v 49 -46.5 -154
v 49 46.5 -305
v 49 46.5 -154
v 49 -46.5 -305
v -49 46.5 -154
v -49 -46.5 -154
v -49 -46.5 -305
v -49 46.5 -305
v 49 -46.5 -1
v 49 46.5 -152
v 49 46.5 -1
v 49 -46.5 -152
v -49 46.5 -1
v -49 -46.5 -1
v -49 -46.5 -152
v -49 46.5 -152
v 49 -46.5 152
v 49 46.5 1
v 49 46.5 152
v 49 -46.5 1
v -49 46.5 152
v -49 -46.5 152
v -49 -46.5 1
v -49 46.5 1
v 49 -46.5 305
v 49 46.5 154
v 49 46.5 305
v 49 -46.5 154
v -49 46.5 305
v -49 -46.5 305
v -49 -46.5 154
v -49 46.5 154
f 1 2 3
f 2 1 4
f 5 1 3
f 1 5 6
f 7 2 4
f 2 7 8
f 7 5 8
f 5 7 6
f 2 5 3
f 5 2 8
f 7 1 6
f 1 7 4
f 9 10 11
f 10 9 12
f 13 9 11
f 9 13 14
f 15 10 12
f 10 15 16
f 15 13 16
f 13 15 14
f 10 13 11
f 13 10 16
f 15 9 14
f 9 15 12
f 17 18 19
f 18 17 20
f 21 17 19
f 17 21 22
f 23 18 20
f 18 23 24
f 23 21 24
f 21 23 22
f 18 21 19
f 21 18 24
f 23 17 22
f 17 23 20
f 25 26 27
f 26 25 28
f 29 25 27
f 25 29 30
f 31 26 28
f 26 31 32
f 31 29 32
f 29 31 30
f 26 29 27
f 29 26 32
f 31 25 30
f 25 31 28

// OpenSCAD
// file: battery.scad
/*
DESCRIPTION
  Model of a 12V battery.

AUTHORS
  Saxon A. Nelson-Milton <saxon@ausocean.org>

LICENSE
  Copyright (C) 2020 the Australian Ocean Lab (AusOcean)

  It is free software: you can redistribute it and/or modify them
  under the terms of the GNU General Public License as published by the
  Free Software Foundation, either version 3 of the License, or (at your
  option) any later version.

  It is distributed in the hope that it will be useful, but WITHOUT
  ANY WARRANTY; without even the implied warranty of MERCHANTABILITY or
  FITNESS FOR A PARTICULAR PURPOSE. See the GNU General Public License
  for more details.

  You should have received a copy of the GNU General Public License
  in gpl.txt.  If not, see http://www.gnu.org/licenses.
*/

include <consts.scad>

battery();

module battery(){
    color([0.2,0.2,0.2])
    cube([battWidth,battHeight,battLength],center=true);
}
// file: consts.scad
/*
DESCRIPTION
  Constants for SCUSU CAD model.

AUTHORS
  Saxon A. Nelson-Milton <saxon@ausocean.org>

LICENSE
  Copyright (C) 2020 the Australian Ocean Lab (AusOcean)

  It is free software: you can redistribute it and/or modify them
  under the terms of the GNU General Public License as published by the
  Free Software Foundation, either version 3 of the License, or (at your
  option) any later version.

  It is distributed in the hope that it will be useful, but WITHOUT
  ANY WARRANTY; without even the implied warranty of MERCHANTABILITY or
  FITNESS FOR A PARTICULAR PURPOSE. See the GNU General Public License
  for more details.

  You should have received a copy of the GNU General Public License
  in gpl.txt.  If not, see http://www.gnu.org/licenses.
*/

alpha = 0.5;

// Misc.
noOfFaces = 500;

$fn = noOfFaces;

// Pipe properties.
pipeLength              = 600;
pipeOuterDiameter       = 160;
pipeInternalDiameter    = 155;

// Access coupling properties.
couplingInnerDiameter = 160;
couplingOuterDiameter = couplingInnerDiameter+10;
couplingLength        = 160;

// Threaded cap properties.
capInnerDiameter    = couplingOuterDiameter;
capOuterDiameter    = 185;
capLength           = 35;

// Battery properties.
battLength = 151;
battWidth = 98;
battHeight = 93;

// Wood properties.
woodColor = [1,178/255,102/255];
woodThickness = 10;

// Battery holder end properties.
holderEndWidth = woodThickness;
holderEndDiameter = pipeInternalDiameter;

// Calculate battery displacement from center.
battDisplacement = sqrt(pow(pipeInternalDiameter/2,2)-pow(battWidth/2,2))-(battHeight/2);

// Reed switch properties.
reedSwitchLen = 40;
reedSwitchWidth = 10;
reedSwitchHeight = 10;
reedSwitchDisplacement = 30;

// Spacer properties.
spacerLegHeight = 120;
spacerLegLength = 80;
// main file
/*
DESCRIPTION
  Models 4 12V batteries in parallel.

AUTHORS
  Saxon A. Nelson-Milton <saxon@ausocean.org>

LICENSE
  Copyright (C) 2020 the Australian Ocean Lab (AusOcean)

  It is free software: you can redistribute it and/or modify them
  under the terms of the GNU General Public License as published by the
  Free Software Foundation, either version 3 of the License, or (at your
  option) any later version.

  It is distributed in the hope that it will be useful, but WITHOUT
  ANY WARRANTY; without even the implied warranty of MERCHANTABILITY or
  FITNESS FOR A PARTICULAR PURPOSE. See the GNU General Public License
  for more details.

  You should have received a copy of the GNU General Public License
  in gpl.txt.  If not, see http://www.gnu.org/licenses.
*/

include <consts.scad>
use <battery.scad>

batteries();

module batteries(){
    translate([0,0,-(3/2)*(2+battLength)])
    for(bn = [0:3]){
        translate([0,0,(battLength+2)*bn]) battery();
    }
}
